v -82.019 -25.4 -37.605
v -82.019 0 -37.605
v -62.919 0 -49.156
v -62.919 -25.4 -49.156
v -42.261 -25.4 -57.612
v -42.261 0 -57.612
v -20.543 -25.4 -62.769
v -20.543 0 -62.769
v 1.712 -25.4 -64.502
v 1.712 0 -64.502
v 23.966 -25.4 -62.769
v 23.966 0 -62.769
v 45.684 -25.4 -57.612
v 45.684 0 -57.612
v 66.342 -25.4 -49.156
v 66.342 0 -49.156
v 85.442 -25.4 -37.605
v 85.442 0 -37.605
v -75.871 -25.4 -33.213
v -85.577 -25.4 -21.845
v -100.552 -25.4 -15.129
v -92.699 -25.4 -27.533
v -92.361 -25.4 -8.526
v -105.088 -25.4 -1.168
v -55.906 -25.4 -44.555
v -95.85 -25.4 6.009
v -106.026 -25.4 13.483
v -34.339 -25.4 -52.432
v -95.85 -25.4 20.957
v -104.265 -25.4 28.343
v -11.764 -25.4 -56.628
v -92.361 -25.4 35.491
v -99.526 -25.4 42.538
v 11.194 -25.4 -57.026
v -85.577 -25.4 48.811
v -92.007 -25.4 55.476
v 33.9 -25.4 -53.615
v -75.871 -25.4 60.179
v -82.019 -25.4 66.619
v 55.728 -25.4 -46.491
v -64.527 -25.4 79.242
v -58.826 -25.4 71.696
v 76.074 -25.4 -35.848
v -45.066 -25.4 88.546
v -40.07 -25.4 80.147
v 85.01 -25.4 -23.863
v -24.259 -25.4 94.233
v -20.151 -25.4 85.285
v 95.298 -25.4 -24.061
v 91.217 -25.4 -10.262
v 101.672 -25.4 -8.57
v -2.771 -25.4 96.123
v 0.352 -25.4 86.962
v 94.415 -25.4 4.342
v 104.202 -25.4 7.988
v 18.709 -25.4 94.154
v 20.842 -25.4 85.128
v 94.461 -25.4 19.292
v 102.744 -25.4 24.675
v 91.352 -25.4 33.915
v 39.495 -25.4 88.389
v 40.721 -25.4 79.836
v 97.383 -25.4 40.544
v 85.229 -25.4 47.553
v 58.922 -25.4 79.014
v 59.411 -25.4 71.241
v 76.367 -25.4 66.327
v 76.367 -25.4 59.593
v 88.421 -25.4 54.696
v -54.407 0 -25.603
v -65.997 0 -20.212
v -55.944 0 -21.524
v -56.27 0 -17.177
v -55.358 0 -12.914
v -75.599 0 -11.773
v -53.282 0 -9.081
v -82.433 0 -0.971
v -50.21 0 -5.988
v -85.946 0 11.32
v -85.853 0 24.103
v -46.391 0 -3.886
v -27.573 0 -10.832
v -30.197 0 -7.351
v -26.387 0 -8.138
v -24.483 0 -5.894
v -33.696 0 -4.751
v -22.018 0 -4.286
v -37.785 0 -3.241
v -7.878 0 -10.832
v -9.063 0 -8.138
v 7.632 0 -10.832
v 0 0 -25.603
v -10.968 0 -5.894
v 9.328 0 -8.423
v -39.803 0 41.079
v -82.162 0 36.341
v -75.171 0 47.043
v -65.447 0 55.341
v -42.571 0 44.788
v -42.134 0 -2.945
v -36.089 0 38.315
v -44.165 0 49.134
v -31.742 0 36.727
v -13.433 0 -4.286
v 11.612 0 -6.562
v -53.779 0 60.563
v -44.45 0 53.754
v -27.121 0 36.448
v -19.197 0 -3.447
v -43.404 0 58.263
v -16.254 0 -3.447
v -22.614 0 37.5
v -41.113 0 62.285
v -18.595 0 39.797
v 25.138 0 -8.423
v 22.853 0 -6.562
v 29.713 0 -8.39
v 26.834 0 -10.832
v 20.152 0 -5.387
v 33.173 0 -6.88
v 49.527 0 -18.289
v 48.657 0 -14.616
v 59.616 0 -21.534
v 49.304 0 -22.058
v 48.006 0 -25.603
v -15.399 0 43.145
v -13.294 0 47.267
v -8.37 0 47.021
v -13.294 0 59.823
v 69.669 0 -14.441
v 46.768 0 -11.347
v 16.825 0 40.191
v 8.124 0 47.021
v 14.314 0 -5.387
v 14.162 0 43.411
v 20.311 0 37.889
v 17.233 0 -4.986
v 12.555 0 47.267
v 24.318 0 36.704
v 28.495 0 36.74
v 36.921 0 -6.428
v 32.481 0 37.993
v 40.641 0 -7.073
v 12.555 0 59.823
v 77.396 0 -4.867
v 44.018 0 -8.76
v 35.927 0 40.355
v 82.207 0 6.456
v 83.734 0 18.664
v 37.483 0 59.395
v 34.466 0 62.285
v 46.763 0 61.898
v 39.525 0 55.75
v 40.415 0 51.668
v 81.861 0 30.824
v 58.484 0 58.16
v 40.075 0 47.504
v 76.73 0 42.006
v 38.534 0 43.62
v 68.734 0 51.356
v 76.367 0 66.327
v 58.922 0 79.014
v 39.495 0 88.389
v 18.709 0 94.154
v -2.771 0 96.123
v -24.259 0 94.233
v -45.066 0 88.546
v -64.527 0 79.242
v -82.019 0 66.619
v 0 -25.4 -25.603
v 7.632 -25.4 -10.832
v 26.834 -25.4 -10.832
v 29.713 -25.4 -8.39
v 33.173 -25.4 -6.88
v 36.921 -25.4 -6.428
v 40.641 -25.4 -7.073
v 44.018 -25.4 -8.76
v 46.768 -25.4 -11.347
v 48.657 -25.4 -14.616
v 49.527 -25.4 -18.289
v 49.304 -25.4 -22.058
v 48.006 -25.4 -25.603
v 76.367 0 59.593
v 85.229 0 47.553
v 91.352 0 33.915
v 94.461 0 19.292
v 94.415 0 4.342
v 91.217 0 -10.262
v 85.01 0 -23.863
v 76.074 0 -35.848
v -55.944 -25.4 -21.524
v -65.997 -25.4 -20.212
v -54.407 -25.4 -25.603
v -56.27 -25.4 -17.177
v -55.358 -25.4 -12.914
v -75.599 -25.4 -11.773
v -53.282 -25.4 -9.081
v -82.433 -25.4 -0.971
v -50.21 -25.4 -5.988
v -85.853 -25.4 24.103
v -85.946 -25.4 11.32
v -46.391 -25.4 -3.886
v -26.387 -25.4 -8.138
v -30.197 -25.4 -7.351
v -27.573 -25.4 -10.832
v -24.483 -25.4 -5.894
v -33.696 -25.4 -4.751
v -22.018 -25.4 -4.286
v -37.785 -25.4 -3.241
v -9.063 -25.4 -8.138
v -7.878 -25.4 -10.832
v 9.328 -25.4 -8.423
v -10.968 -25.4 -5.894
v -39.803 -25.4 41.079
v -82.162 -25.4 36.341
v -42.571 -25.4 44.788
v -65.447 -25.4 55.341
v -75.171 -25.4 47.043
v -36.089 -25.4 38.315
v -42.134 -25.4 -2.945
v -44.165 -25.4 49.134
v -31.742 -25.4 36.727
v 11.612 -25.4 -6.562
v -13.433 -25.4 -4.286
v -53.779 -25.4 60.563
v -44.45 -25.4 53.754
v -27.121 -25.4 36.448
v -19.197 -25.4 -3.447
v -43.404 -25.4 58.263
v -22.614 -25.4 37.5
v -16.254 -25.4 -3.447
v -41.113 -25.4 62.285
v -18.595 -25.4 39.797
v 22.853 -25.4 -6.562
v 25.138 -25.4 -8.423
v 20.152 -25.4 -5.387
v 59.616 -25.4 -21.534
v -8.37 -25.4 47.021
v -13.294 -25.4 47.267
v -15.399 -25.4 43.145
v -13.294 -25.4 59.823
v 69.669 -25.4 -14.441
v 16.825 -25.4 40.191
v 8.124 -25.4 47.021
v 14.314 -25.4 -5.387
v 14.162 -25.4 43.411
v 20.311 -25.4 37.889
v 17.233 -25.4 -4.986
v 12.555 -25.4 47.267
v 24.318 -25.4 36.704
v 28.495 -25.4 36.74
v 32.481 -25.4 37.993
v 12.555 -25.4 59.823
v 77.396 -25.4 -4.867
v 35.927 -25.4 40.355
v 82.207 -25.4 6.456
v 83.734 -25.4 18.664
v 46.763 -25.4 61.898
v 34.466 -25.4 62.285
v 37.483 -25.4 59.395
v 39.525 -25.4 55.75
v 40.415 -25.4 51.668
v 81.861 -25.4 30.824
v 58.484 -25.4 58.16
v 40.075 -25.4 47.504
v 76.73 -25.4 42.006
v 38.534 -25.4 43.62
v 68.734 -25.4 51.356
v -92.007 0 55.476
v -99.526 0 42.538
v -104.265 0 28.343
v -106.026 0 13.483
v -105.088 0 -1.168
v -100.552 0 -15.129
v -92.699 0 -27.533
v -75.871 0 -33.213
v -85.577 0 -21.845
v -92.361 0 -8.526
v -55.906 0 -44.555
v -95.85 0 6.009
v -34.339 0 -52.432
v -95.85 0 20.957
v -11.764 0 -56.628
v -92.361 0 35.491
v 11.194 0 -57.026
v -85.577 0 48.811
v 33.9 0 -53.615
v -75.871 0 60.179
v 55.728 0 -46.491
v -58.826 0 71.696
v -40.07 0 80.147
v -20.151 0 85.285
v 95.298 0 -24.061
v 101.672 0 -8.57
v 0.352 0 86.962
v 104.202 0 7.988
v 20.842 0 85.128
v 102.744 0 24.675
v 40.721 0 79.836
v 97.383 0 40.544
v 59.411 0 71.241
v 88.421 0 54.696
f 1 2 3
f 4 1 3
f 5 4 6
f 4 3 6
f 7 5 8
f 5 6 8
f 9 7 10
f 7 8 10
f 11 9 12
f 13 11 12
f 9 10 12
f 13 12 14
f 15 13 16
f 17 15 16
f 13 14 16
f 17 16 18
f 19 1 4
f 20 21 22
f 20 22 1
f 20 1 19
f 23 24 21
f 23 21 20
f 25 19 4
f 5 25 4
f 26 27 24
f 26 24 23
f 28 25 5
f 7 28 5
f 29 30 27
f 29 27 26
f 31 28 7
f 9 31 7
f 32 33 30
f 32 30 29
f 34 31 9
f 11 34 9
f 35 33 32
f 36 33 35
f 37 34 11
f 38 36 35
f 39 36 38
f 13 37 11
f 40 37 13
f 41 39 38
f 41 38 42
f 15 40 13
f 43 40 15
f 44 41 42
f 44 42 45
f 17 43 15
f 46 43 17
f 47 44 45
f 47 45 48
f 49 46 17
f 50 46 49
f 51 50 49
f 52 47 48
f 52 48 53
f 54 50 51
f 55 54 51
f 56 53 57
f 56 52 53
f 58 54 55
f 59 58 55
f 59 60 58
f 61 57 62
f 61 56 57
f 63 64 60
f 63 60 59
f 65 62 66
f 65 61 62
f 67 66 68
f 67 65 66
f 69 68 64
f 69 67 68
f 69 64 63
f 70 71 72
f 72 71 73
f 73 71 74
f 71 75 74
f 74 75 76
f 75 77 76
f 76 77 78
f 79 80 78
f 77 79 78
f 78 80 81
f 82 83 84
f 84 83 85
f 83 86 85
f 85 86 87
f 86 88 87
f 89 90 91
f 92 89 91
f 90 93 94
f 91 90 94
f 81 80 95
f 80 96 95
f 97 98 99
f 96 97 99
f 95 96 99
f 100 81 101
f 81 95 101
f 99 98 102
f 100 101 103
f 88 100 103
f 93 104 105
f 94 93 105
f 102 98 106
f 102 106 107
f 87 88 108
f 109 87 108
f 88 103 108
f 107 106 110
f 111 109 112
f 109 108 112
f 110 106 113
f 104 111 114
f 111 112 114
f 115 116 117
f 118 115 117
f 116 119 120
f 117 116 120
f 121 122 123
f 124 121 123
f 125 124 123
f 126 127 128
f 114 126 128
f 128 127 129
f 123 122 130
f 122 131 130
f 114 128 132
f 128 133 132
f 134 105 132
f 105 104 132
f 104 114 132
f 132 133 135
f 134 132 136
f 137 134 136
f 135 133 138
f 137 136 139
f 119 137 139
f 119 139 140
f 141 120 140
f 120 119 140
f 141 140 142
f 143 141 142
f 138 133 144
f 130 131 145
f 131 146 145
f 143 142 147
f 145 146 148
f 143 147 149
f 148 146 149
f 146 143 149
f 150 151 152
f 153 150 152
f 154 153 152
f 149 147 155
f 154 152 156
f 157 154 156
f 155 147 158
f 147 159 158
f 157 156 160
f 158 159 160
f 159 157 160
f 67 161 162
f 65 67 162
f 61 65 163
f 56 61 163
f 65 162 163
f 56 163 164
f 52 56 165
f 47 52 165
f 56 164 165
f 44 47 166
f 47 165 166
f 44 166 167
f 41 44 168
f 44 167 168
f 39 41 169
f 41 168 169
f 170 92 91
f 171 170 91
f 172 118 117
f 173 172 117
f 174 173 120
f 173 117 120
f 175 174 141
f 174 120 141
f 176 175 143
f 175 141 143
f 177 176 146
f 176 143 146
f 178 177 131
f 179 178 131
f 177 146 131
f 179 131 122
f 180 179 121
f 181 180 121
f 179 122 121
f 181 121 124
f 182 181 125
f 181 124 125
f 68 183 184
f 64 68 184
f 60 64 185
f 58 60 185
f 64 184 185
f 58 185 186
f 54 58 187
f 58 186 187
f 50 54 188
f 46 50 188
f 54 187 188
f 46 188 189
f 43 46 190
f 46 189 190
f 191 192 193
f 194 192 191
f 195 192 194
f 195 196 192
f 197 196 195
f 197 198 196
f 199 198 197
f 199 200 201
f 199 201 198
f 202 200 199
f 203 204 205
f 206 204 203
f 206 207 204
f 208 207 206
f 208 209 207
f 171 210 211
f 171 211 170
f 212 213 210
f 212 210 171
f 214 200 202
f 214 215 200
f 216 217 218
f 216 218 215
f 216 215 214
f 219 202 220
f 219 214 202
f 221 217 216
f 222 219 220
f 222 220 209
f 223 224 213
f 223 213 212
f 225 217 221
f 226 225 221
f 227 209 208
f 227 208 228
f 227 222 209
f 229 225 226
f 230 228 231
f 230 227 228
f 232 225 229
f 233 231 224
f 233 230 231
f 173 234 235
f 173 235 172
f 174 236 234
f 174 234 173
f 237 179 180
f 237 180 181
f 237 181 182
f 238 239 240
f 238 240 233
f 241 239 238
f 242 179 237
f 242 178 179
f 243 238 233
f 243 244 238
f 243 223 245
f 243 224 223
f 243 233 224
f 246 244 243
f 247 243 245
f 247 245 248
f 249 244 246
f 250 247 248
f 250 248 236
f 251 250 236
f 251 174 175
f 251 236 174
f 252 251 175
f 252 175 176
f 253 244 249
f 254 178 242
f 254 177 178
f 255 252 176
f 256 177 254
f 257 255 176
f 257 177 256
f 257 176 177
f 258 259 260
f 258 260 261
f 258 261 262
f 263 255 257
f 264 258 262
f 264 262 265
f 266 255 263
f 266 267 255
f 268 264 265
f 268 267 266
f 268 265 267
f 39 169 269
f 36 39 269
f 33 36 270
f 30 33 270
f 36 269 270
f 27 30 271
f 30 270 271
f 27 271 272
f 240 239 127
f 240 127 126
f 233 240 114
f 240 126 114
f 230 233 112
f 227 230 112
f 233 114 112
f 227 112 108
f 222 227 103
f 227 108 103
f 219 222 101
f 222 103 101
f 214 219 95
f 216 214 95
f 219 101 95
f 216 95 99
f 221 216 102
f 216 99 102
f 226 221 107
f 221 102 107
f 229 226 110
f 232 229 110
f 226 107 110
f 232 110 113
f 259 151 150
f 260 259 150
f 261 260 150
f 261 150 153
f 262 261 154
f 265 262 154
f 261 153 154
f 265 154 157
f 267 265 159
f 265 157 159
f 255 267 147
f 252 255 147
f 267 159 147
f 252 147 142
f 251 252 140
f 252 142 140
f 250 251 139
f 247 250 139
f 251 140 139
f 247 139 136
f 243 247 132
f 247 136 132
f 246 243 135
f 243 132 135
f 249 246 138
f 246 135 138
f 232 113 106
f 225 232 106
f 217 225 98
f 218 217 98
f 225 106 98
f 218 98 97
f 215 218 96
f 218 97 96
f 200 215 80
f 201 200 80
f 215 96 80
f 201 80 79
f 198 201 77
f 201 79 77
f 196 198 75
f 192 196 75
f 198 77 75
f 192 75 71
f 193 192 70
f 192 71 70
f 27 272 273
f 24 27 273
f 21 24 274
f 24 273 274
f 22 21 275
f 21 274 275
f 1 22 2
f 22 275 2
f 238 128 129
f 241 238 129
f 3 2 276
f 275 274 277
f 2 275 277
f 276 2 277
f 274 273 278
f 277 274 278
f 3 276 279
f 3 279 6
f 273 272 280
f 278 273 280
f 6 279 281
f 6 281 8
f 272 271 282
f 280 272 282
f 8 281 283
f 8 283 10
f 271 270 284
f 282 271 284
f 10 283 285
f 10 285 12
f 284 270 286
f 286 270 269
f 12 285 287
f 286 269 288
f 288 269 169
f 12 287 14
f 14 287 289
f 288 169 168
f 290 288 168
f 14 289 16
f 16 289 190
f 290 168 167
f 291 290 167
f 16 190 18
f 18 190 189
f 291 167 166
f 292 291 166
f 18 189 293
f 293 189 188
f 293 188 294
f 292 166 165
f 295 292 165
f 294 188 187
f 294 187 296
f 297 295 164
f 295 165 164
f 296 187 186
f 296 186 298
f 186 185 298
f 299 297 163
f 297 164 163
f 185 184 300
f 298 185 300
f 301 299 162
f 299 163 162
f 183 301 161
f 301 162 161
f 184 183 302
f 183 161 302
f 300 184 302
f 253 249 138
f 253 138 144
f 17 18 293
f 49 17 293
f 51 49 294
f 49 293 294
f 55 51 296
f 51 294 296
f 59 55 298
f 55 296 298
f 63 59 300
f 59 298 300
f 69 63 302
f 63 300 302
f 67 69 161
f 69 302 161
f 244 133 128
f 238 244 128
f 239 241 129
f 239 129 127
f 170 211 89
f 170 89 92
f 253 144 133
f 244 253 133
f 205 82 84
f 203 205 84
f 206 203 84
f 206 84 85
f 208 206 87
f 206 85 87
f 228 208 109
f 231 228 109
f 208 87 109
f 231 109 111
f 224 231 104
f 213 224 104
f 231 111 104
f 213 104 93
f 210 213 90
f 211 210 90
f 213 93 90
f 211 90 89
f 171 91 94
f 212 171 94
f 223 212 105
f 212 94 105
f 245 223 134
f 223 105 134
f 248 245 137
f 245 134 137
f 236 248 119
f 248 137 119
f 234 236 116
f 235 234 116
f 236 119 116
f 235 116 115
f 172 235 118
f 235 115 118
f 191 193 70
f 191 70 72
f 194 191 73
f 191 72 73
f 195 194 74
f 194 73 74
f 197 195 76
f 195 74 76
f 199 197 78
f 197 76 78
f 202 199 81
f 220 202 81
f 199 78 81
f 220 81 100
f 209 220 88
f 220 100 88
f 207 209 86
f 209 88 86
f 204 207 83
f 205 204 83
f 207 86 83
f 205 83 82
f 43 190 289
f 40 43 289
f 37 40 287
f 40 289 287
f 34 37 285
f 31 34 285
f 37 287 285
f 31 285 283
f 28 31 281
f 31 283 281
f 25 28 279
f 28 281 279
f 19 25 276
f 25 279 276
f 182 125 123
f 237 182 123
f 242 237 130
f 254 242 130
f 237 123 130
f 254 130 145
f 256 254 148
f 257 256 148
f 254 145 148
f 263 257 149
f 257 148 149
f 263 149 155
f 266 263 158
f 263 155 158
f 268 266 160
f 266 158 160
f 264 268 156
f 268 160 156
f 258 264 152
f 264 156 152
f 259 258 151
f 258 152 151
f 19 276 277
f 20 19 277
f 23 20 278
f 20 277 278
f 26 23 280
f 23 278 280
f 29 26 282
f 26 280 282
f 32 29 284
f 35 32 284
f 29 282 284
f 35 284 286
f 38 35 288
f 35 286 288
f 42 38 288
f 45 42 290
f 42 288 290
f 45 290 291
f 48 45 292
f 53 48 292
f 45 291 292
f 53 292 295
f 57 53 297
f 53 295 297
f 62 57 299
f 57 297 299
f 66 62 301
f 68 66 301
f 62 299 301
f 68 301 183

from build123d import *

# Parameters (mm, degrees)
F1_DEPTH = 25.4


with BuildPart() as f1:
    # F0 (on Front) → F1 (new body)
    with BuildSketch(Plane.XZ):
        with BuildLine():
            ThreePointArc((76.366656, 66.326715), (-2.771333, 96.122792), (-82.018934, 66.619486))
            ThreePointArc((-82.018934, 66.619486), (-99.526069, 42.537665), (-106.025629, 13.482723))
            ThreePointArc((-106.025629, 13.482723), (-100.55177, -15.129278), (-82.018934, -37.604682))
            ThreePointArc((-82.018934, -37.604682), (1.711711, -64.50179), (85.442357, -37.604682))
            ThreePointArc((85.442357, -37.604682), (103.971492, 16.375317), (76.366656, 66.326715))
        make_face()
        with BuildLine():
            ThreePointArc((-75.870886, -33.213213), (-96.290493, 13.482723), (-75.870886, 60.17866))
            ThreePointArc((-75.870886, 60.17866), (0.352022, 86.961837), (76.366656, 59.593134))
            ThreePointArc((76.366656, 59.593134), (94.835651, 11.815417), (76.073892, -35.848096))
            ThreePointArc((76.073892, -35.848096), (-0.293424, -57.304748), (-75.870886, -33.213213))
        make_face(mode=Mode.SUBTRACT)
        with BuildLine():
            Line((8.124091, 47.021262), (-8.370277, 47.021262))
            Line((-8.370277, 47.021262), (-13.293969, 59.822861))
            Line((-13.293969, 59.822861), (-13.293969, 47.267448))
            ThreePointArc((-13.293969, 47.267448), (-36.089482, 38.314973), (-41.112833, 62.284708))
            ThreePointArc((-41.112833, 62.284708), (-85.853336, 24.102798), (-54.406799, -25.603199))
            ThreePointArc((-54.406799, -25.603199), (-48.375276, -4.8006), (-27.572677, -10.832123))
            ThreePointArc((-27.572677, -10.832123), (-17.725292, -3.340109), (-7.877908, -10.832123))
            Line((-7.877908, -10.832123), (0, -25.603199))
            Line((0, -25.603199), (7.631723, -10.832123))
            ThreePointArc((7.631723, -10.832123), (17.232923, -4.985765), (26.834123, -10.832123))
            ThreePointArc((26.834123, -10.832123), (44.018369, -8.760086), (48.005998, -25.603199))
            ThreePointArc((48.005998, -25.603199), (83.219527, 24.808814), (34.465849, 62.284708))
            ThreePointArc((34.465849, 62.284708), (34.291586, 39.046487), (12.555416, 47.267448))
            Line((12.555416, 47.267448), (12.555416, 59.822861))
            Line((12.555416, 59.822861), (8.124091, 47.021262))
        make_face()
    extrude(amount=F1_DEPTH)


solid = f1.part
